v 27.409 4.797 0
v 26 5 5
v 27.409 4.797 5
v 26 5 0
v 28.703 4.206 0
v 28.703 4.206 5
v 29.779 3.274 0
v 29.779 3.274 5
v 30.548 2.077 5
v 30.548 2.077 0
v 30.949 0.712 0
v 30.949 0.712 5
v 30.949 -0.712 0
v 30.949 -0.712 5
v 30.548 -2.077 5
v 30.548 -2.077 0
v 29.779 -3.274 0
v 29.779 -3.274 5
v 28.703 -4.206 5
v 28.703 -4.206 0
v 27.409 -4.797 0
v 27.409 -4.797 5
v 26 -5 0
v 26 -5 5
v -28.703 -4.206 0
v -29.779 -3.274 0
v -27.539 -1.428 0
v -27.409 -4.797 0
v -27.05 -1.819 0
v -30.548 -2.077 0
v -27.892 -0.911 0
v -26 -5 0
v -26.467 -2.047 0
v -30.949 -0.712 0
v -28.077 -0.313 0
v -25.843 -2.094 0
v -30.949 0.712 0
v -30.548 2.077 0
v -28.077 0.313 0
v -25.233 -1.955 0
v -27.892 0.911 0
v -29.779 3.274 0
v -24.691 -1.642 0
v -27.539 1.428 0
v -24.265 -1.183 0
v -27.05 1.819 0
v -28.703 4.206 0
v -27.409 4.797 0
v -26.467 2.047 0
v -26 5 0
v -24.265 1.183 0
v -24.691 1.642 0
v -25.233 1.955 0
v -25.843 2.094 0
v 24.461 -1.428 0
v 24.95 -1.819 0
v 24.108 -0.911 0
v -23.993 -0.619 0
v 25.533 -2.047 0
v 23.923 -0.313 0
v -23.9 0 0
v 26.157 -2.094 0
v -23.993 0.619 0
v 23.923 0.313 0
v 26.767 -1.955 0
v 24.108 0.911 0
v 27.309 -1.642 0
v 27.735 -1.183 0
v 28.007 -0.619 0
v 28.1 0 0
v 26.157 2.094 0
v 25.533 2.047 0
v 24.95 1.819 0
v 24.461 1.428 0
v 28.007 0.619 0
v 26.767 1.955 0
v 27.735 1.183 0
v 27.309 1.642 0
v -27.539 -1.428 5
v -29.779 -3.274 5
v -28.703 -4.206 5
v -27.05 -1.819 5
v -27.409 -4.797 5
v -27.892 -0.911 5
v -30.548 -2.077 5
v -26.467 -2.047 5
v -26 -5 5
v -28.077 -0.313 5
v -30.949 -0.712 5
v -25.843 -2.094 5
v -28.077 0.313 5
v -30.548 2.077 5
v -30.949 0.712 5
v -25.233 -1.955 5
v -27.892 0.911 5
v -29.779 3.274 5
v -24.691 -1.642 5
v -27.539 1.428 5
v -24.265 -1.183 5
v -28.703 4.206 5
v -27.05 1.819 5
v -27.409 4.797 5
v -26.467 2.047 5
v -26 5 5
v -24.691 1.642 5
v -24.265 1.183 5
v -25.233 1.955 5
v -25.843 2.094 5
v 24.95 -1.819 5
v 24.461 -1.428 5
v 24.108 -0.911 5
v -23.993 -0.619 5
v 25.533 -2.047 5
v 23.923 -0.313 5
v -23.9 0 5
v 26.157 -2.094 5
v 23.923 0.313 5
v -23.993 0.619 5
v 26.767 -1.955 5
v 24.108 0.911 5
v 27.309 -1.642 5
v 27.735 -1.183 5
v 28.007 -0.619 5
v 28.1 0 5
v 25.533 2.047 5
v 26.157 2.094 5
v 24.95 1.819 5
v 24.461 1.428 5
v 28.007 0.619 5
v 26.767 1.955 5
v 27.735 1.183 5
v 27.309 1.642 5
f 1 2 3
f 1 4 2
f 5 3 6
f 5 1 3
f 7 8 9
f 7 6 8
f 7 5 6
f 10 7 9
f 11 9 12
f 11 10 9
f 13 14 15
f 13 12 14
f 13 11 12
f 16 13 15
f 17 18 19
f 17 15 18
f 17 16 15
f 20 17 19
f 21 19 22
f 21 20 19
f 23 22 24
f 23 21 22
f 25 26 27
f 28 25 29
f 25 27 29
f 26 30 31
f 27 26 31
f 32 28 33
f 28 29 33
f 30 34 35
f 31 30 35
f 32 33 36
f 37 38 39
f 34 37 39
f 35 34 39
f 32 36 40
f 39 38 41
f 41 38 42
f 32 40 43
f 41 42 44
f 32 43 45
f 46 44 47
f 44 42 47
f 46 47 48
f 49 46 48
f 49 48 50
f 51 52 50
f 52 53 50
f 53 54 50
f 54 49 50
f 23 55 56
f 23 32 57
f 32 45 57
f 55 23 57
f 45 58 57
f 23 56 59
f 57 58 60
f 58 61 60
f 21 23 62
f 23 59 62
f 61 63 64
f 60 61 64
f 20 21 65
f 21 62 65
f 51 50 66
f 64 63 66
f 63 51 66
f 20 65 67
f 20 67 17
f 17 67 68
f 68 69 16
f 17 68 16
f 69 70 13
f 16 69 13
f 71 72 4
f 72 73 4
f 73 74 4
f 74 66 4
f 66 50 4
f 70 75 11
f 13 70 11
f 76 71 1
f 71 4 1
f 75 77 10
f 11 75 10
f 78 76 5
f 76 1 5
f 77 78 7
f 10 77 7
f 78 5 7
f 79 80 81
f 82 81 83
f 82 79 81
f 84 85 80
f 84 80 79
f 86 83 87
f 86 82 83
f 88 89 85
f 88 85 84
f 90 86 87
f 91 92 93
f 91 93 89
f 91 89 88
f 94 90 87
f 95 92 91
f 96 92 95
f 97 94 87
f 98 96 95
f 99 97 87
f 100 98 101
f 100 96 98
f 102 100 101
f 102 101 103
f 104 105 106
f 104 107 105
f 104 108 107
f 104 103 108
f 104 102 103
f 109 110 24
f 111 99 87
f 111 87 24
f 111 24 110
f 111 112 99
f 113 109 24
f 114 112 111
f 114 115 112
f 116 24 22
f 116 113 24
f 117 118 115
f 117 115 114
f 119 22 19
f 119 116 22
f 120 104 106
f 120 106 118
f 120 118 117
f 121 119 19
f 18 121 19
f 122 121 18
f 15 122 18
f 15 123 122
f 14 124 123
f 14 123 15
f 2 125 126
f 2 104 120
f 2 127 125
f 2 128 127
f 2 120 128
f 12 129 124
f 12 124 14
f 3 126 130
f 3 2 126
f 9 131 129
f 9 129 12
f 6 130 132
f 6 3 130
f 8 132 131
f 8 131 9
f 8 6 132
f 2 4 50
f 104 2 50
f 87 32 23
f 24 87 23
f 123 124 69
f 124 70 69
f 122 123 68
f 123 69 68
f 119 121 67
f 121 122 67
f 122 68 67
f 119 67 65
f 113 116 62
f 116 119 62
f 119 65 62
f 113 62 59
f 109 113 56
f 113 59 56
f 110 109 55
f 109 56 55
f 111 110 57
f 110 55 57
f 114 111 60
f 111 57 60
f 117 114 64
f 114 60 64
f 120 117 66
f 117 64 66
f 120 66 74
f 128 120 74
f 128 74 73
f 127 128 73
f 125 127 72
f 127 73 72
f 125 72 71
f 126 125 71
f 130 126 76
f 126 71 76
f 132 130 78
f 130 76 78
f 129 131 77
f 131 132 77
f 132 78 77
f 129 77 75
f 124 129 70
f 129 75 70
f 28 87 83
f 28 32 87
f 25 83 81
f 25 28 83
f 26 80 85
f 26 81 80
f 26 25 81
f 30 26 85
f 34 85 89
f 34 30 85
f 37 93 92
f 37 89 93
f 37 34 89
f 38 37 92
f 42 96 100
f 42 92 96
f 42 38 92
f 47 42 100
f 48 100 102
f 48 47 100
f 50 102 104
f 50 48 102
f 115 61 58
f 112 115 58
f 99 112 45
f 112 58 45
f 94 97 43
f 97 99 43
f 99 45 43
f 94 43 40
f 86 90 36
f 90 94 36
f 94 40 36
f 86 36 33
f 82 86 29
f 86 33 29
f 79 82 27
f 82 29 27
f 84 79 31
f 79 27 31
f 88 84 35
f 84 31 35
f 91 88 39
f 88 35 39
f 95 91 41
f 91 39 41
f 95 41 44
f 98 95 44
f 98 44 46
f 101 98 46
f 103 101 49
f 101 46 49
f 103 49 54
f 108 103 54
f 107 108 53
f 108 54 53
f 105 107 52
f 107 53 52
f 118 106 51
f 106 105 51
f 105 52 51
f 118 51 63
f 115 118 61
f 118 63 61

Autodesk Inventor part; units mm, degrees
ref_plane "YZ Plane" through (0, 0, 0) normal (1, 0, 0) x (0, 1, 0)
ref_plane "XZ Plane" through (0, 0, 0) normal (0, 1, 0) x (-1, 0, 0)
ref_plane "XY Plane" through (0, 0, 0) normal (0, 0, 1) x (1, 0, 0)
sketch "Sketch1" plane through (0, 0, 0) normal (0, 0, 1) x (1, 0, 0)
  line L0 (-26, 0) -> (26, 0) construction
  line L1 (-26, -5) -> (26, -5)
  line L2 (26, 5) -> (-26, 5)
  arc A0 (-26, 5) -> (-26, -5) centre (-26, 0) ccw
  arc A1 (26, -5) -> (26, 5) centre (26, 0) ccw
  circle A2 centre (-26, 0) radius 2.1
  circle A3 centre (26, 0) radius 2.1
  point P0 (0, 0)
  point P1 (0, 0)
  point P2 (0, -1.8466)
  point P3 (0, 1.8466)
  dimension "d0" = 10
  dimension "d1" = 52
  dimension "d2" = 4.2
  dimension "d3" = 4.2
extrude "Extrusion1" add sketch "Sketch1" along normal blind 5
equation "\"d2\" = d3"
properties part number "lower-tipper-link"
